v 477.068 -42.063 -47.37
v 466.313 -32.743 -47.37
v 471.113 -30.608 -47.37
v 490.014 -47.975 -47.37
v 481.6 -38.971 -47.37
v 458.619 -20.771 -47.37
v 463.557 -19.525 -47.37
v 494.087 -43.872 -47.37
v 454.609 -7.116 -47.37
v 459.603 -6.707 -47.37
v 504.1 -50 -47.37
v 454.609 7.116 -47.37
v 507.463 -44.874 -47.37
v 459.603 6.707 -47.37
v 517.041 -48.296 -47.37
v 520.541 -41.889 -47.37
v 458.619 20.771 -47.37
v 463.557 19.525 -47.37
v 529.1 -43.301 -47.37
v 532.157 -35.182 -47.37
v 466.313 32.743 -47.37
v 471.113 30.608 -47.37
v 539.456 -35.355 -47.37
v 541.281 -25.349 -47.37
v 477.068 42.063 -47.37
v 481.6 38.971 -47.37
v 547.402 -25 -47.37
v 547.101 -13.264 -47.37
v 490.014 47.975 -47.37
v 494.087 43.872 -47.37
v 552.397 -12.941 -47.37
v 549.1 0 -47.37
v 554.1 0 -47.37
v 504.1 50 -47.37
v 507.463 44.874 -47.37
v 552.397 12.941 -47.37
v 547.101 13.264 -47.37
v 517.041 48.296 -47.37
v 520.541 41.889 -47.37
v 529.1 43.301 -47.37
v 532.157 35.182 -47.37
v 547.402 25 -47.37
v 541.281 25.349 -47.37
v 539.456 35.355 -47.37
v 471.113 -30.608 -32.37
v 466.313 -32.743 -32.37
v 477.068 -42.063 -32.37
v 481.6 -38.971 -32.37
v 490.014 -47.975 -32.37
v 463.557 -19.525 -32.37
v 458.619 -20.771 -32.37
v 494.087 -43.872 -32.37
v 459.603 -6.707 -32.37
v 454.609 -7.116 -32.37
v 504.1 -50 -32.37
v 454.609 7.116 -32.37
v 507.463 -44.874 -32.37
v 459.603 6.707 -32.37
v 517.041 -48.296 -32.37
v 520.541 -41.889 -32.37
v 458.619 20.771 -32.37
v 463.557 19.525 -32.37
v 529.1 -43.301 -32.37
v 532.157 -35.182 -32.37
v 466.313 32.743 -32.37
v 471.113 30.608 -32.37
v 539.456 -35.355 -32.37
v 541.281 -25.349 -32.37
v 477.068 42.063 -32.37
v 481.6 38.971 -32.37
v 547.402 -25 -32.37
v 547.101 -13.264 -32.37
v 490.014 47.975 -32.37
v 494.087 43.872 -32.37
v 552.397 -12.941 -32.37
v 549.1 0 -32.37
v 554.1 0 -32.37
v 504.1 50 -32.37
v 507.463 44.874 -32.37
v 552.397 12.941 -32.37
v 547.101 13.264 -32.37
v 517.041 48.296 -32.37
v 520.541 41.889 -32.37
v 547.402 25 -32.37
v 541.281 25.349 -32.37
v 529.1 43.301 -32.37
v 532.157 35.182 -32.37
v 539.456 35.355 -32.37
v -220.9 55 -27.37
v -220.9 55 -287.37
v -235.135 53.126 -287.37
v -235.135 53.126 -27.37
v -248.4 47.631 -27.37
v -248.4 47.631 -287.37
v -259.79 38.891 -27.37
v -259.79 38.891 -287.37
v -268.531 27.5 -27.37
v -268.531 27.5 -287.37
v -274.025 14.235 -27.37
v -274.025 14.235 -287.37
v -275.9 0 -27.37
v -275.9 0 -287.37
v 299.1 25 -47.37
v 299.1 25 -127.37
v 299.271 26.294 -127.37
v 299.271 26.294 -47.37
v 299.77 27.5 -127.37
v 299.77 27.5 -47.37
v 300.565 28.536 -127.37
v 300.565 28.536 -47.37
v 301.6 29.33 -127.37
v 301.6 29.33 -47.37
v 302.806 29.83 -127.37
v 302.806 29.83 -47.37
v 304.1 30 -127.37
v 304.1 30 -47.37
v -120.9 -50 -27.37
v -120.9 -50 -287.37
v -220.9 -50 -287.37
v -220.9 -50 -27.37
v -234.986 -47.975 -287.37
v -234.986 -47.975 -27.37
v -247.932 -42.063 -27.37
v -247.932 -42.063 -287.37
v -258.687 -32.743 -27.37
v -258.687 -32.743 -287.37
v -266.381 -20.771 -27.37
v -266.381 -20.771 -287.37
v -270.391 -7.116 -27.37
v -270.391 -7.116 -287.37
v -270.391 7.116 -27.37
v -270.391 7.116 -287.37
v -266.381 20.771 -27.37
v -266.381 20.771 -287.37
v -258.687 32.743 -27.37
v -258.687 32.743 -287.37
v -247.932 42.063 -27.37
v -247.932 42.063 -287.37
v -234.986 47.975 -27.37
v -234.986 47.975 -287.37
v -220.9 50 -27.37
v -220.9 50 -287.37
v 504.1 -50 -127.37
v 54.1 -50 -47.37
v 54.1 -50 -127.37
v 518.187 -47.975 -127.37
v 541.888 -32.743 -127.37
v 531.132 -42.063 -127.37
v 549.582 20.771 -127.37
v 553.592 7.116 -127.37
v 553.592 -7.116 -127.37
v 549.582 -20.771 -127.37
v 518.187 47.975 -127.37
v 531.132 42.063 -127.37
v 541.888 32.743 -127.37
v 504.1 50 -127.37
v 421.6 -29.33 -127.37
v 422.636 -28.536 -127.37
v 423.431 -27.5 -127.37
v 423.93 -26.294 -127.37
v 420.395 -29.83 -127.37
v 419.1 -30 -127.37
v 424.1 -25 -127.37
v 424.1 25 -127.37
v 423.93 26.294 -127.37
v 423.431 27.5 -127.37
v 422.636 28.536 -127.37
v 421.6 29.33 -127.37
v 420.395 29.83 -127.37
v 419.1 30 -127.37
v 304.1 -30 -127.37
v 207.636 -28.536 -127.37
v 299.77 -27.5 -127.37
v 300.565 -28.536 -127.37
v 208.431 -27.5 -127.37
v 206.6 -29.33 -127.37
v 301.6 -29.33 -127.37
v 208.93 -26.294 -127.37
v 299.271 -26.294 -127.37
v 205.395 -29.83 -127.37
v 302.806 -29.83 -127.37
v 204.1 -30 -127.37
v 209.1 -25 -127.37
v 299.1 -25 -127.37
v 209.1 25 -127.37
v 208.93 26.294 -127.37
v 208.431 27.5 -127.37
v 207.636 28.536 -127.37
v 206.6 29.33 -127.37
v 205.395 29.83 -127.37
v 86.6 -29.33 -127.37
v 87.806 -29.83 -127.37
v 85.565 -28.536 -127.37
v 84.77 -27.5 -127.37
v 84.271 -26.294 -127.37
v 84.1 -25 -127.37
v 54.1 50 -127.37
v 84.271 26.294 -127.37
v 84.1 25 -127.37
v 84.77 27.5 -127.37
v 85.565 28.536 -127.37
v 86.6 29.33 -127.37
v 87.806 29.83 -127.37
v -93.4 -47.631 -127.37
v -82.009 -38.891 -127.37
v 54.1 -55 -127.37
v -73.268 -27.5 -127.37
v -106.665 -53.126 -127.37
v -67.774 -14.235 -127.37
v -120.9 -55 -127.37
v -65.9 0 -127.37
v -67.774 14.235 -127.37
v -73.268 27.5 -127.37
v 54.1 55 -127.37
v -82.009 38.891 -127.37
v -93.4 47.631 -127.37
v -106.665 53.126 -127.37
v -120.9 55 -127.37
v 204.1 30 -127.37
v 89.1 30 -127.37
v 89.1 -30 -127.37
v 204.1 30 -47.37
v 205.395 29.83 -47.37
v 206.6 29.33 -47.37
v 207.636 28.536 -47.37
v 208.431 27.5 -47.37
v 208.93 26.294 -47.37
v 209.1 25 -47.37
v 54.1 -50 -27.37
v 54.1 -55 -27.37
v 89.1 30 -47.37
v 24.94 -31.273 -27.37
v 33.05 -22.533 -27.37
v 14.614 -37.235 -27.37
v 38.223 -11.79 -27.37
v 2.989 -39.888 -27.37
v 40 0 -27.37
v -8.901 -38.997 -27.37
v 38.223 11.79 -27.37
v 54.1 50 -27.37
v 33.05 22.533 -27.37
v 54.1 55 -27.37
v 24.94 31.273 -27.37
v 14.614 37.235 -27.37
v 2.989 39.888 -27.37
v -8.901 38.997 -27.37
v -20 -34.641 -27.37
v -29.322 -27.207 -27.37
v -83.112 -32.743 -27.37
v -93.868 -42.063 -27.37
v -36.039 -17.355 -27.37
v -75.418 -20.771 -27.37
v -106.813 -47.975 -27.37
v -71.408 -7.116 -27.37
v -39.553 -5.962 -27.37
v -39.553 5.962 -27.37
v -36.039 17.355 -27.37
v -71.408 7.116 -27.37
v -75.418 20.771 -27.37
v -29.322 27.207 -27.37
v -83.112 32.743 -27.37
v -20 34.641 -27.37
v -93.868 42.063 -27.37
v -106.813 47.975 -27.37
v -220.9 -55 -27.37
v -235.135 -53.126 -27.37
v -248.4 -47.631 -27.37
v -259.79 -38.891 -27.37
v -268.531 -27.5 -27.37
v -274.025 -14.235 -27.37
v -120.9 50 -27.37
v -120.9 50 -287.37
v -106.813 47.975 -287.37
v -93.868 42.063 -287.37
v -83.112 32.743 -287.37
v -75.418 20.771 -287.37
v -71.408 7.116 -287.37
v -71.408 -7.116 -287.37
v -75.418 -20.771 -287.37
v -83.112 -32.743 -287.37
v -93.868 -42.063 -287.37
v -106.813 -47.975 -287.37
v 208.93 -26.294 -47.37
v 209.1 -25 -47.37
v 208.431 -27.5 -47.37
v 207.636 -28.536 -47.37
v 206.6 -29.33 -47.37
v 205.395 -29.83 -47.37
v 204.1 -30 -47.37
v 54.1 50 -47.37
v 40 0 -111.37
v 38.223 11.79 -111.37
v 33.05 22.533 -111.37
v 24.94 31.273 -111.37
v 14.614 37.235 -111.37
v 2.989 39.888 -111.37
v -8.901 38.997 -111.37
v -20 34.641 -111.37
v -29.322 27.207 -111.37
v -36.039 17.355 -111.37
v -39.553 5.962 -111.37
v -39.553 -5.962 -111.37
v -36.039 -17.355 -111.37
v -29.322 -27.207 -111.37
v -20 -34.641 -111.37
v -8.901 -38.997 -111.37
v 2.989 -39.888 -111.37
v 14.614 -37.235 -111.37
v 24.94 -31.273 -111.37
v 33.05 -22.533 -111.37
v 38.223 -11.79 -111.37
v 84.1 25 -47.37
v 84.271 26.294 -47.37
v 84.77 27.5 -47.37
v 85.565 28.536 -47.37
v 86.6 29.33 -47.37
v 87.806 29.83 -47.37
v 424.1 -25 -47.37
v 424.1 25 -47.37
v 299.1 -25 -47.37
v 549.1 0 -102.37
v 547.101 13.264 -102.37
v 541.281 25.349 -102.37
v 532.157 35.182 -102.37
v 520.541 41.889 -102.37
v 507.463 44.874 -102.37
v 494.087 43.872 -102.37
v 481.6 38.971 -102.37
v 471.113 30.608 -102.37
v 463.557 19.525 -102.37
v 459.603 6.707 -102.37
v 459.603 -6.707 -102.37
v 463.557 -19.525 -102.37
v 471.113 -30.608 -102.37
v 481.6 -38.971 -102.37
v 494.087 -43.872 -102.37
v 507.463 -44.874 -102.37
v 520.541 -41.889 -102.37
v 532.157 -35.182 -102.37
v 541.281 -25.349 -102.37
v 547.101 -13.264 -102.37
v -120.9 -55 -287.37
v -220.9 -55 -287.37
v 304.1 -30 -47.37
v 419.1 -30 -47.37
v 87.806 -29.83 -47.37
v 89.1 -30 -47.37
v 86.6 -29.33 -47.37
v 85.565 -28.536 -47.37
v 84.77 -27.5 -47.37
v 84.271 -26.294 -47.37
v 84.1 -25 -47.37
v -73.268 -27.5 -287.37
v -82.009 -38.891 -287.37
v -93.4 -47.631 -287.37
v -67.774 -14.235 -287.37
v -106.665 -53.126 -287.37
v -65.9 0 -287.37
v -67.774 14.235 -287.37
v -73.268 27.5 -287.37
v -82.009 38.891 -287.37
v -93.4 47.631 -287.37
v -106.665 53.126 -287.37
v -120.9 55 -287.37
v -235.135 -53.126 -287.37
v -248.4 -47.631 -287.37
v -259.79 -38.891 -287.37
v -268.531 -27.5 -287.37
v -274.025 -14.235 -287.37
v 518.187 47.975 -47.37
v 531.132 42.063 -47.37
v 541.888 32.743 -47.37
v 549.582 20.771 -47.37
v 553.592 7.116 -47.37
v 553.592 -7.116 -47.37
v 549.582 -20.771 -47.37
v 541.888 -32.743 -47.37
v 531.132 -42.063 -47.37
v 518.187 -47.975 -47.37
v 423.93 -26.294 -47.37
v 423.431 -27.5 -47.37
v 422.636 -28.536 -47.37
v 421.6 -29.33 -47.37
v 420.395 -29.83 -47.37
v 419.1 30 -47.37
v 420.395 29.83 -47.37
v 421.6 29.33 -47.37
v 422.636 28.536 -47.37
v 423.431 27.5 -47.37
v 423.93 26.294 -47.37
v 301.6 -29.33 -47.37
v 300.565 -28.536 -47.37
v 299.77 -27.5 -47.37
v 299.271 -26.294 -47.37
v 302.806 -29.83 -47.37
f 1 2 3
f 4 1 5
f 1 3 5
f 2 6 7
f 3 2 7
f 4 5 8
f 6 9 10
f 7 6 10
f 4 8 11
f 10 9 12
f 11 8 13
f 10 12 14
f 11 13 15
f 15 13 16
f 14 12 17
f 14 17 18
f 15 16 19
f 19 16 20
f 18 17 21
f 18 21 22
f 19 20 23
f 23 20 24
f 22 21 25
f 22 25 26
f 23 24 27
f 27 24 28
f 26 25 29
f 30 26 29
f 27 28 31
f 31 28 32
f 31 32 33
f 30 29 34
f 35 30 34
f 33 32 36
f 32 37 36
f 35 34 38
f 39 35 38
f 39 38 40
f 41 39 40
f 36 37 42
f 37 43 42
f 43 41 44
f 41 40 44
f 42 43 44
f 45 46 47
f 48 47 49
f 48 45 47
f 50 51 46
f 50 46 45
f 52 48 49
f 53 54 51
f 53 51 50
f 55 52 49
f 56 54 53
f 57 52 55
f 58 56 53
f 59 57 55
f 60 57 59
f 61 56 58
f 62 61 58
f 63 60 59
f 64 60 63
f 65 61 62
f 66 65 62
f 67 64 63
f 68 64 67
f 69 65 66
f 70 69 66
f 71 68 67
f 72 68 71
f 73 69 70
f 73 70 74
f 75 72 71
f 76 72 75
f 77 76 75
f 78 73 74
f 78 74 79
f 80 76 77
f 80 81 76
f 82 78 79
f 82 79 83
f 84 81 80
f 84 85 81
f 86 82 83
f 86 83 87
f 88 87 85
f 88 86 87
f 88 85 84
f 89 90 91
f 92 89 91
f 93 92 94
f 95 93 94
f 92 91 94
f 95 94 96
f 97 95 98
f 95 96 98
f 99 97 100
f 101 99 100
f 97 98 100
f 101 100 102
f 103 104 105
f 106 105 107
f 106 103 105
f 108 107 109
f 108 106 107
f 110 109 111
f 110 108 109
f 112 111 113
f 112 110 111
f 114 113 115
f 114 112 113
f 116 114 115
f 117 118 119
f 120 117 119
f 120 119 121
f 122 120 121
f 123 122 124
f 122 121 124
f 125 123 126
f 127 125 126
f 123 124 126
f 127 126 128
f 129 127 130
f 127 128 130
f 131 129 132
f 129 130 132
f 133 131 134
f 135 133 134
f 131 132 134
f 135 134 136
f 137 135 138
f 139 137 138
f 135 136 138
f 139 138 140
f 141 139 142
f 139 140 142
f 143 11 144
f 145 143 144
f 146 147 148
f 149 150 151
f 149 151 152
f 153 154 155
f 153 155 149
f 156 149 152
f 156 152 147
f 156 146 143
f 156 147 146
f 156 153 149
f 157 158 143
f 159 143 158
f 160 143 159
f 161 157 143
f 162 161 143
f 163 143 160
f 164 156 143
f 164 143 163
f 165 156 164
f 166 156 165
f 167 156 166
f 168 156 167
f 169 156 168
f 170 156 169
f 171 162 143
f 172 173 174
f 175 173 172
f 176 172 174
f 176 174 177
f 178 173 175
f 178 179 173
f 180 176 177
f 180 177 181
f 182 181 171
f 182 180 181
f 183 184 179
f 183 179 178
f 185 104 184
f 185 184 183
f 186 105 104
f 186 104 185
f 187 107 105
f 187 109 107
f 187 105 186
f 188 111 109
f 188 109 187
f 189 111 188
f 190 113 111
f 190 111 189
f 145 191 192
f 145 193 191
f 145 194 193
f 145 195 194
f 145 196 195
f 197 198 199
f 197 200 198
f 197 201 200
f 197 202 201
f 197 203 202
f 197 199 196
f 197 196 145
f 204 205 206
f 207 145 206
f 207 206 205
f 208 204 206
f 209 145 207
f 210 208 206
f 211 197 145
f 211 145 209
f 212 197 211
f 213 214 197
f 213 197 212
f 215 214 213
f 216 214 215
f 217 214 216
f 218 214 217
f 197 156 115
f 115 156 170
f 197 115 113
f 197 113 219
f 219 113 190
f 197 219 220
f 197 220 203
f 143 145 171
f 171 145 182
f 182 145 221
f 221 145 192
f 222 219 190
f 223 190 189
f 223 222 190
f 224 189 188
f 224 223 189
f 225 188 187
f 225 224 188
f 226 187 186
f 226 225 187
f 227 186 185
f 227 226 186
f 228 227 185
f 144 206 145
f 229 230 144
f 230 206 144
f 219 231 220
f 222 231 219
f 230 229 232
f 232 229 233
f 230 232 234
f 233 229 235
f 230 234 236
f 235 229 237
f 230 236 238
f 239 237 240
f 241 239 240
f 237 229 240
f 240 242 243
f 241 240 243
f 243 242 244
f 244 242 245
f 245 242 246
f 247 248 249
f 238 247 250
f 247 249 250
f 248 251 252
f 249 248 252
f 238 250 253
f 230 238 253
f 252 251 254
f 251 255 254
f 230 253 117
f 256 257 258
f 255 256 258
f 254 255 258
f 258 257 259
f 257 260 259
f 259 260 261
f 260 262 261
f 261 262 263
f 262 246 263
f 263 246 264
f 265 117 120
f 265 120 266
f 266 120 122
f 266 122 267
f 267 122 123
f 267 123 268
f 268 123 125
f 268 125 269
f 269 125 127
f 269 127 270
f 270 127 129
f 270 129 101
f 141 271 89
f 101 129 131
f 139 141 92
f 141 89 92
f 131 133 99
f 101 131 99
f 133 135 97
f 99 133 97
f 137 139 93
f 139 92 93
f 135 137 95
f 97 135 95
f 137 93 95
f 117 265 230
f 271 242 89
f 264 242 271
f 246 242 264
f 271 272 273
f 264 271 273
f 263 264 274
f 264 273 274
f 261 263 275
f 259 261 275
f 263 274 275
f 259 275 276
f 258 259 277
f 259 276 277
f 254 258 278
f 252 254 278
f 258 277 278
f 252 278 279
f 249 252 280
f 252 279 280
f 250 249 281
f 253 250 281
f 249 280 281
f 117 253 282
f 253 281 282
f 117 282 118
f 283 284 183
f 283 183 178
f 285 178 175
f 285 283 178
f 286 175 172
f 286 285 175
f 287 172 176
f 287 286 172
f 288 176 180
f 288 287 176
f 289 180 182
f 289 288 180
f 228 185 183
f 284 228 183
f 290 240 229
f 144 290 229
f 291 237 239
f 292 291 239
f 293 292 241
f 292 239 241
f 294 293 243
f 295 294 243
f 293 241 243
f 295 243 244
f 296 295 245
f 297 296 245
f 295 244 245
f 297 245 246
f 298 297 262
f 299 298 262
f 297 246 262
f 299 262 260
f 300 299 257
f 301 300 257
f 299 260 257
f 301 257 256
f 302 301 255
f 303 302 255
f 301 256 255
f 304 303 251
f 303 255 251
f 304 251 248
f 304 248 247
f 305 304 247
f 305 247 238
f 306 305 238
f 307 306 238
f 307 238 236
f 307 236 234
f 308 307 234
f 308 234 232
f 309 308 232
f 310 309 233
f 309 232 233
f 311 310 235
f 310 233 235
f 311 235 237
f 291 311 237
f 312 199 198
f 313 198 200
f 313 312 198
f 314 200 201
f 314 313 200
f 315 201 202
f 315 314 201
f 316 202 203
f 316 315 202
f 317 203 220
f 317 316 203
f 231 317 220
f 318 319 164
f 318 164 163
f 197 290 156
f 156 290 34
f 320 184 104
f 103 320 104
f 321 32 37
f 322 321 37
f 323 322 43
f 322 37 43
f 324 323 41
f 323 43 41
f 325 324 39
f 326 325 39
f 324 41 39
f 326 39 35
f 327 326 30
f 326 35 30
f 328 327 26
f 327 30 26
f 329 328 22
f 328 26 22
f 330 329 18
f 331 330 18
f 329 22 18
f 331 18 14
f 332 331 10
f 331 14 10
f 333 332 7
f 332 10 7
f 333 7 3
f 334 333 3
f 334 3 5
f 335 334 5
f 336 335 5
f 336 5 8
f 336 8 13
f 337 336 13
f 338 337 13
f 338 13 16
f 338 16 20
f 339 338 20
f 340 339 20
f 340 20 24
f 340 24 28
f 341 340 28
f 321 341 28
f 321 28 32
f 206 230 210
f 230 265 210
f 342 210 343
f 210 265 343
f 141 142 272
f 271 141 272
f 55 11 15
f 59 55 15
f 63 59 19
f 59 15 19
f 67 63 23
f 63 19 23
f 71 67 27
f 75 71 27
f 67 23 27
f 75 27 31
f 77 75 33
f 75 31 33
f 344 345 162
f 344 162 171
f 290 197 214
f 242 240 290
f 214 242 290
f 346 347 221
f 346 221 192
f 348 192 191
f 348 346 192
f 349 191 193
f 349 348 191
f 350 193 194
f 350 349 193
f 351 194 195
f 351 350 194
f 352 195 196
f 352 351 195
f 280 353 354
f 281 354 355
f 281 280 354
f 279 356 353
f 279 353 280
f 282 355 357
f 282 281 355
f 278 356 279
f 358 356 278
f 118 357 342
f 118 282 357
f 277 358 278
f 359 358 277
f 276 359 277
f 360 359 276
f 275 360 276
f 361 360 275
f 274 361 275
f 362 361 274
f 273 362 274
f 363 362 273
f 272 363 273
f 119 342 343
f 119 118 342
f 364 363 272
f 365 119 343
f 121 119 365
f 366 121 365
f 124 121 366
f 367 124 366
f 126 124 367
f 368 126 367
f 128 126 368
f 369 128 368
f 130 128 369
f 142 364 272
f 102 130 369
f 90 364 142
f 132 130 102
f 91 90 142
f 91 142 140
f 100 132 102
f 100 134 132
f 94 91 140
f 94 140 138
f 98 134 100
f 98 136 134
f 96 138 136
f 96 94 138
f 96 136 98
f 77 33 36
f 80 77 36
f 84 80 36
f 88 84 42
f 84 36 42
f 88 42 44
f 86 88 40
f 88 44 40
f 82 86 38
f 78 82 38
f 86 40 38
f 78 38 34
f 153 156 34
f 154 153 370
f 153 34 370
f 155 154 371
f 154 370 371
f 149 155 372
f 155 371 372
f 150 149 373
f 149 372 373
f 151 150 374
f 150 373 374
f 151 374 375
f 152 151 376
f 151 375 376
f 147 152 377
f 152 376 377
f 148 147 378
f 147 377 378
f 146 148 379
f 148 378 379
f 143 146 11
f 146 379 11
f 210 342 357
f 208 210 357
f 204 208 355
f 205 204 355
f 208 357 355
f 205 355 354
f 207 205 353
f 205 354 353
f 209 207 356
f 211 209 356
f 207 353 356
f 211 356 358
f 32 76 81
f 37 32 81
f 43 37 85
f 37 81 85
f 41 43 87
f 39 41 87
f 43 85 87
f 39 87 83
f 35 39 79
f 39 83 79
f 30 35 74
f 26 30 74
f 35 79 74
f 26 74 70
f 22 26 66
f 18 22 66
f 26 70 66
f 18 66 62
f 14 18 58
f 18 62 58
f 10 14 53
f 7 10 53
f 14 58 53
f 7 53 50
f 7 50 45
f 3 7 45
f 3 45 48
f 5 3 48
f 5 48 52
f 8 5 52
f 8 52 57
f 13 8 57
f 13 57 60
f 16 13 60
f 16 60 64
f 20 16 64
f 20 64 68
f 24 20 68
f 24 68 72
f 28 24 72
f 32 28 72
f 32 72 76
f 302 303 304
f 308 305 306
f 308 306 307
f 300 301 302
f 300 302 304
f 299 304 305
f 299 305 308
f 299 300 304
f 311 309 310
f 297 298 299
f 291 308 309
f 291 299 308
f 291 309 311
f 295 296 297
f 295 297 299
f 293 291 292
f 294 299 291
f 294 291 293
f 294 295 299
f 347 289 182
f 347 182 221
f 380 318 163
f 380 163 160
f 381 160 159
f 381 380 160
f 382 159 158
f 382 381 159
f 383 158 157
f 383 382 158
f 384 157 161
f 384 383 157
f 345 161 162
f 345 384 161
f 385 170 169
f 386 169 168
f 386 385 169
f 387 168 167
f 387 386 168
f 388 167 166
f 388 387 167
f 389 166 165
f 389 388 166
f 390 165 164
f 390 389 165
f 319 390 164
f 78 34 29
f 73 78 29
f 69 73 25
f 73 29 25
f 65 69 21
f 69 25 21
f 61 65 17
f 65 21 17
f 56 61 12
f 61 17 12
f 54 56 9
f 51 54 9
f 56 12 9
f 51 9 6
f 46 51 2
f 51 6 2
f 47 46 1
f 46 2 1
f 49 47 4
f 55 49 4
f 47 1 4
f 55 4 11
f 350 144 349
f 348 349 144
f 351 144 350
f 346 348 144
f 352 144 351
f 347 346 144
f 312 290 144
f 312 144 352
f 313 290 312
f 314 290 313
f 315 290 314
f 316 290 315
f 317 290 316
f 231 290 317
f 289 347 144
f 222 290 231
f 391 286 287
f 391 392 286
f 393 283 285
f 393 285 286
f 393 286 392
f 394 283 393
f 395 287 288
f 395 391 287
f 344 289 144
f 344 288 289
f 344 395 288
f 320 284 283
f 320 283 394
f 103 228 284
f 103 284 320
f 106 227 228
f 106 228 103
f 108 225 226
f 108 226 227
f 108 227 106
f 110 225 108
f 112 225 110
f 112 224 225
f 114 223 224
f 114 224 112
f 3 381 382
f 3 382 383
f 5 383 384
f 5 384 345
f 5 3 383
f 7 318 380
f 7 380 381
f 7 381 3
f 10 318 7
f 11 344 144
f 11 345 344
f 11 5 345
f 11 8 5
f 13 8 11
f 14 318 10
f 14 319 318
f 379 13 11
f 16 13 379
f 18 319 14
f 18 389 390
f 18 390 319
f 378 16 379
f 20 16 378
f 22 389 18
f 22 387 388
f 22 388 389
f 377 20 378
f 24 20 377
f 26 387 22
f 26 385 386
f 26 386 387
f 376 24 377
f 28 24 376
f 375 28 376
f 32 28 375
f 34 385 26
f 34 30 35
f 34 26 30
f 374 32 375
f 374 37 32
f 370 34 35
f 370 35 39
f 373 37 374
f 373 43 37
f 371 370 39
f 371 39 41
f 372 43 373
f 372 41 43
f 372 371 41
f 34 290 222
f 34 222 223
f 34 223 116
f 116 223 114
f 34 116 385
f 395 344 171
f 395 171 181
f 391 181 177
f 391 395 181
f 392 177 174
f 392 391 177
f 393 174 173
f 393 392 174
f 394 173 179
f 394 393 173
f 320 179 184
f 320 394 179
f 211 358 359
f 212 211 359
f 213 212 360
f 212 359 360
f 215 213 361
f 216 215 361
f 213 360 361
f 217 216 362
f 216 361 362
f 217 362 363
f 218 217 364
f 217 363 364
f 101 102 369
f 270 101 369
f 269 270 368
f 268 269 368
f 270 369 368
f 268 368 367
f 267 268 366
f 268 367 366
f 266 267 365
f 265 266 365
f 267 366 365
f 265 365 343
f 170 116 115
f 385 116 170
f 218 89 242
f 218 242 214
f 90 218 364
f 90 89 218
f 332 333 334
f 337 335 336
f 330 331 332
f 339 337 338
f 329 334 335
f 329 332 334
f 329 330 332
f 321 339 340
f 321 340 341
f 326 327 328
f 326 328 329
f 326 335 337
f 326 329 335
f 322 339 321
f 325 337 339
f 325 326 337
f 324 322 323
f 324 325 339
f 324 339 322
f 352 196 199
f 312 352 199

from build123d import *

# Parameters (mm, degrees)
SKETCH1_R             = 50
SKETCH1_W             = 100
SKETCH1_H             = 110
SKETCH1_W_2           = 230
SKETCH1_H_2           = 55
BOSS_EXTRUDE1_DEPTH   = 100
SKETCH2_W             = 160
SKETCH2_H             = 210
BOSS_EXTRUDE2_DEPTH   = 110
CUT_EXTRUDE1_DEPTH    = 260
CUT_EXTRUDE2_DEPTH    = 160
CUT_EXTRUDE3_DEPTH    = 100
BODY_MOVE_COPY1_ANGLE = 86
SKETCH15_R            = 40
CUT_EXTRUDE4_DEPTH    = 84
CUT_EXTRUDE5_DEPTH    = 20
BOSS_EXTRUDE3_DEPTH   = 15
BODY_MOVE_COPY6_ANGLE = 4
CUT_EXTRUDE6_DEPTH    = 270
SKETCH20_R            = 45
CUT_EXTRUDE7_DEPTH    = 70


with BuildPart() as part:
    # Sketch1 → Boss-Extrude1 (new body)
    with BuildSketch(Plane(origin=(0, 0, 0), x_dir=(0, 0, -1), z_dir=(1, 0, 0))):
        with BuildLine():
            Line((-50, 50), (-500, 50))
            ThreePointArc((-500, 50), (-464.644660941, 35.355339059), (-450, 0))
            ThreePointArc((-450, 0), (-464.644660941, -35.355339059), (-500, -50))
            Line((-500, -50), (-50, -50))
            Line((-50, -50), (-50, 50))
        make_face()
        with Locations((-500, 0)):
            Circle(SKETCH1_R)
        Rectangle(SKETCH1_W, SKETCH1_H)
        with Locations((165, -27.5)):
            Rectangle(SKETCH1_W_2, SKETCH1_H_2)
        with Locations((165, 27.5)):
            Rectangle(SKETCH1_W_2, SKETCH1_H_2)
    extrude(amount=BOSS_EXTRUDE1_DEPTH)

    # Sketch2 → Boss-Extrude2 (add)
    with BuildSketch(Plane(origin=(0, 55, 0), x_dir=(1, 0, 0), z_dir=(0, 1, 0))):
        with Locations((180, 175)):
            Rectangle(SKETCH2_W, SKETCH2_H)
    extrude(amount=-BOSS_EXTRUDE2_DEPTH)

    # Sketch3 → Cut-Extrude1 (cut)
    with BuildSketch(Plane(origin=(260, 0, 0), x_dir=(0, 0, -1), z_dir=(1, 0, 0))):
        with BuildLine():
            ThreePointArc((225, 55), (263.890872965, 38.890872965), (280, 0))
            Line((280, 0), (280, 55))
            Line((280, 55), (225, 55))
        make_face()
        with BuildLine():
            ThreePointArc((280, 0), (263.890872965, -38.890872965), (225, -55))
            Line((225, -55), (280, -55))
            Line((280, -55), (280, 0))
        make_face()
    extrude(amount=-CUT_EXTRUDE1_DEPTH, mode=Mode.SUBTRACT)

    # Sketch3<3> → Cut-Extrude2 (cut)
    with BuildSketch(Plane(origin=(260, 0, 0), x_dir=(0, 0, -1), z_dir=(1, 0, 0))):
        with BuildLine():
            Line((70, 55), (70, 2.89e-07))
            ThreePointArc((70, 2.89e-07), (86.109127186, 38.890873117), (125.00000014, 55))
            Line((125.00000014, 55), (70, 55))
        make_face()
        with BuildLine():
            Line((70, 2.89e-07), (70, -55))
            Line((70, -55), (125.000000101, -55))
            ThreePointArc((125.000000101, -55), (86.109126968, -38.890872899), (70, 2.89e-07))
        make_face()
    extrude(amount=-CUT_EXTRUDE2_DEPTH, mode=Mode.SUBTRACT)

    # Sketch12 → Cut-Extrude3 (cut)
    with BuildSketch(Plane.ZY):
        with BuildLine():
            Line((85, 30), (200, 30))
            ThreePointArc((200, 30), (203.535533906, 28.535533906), (205, 25))
            Line((205, 25), (205, -25))
            ThreePointArc((205, -25), (203.535533906, -28.535533906), (200, -30))
            Line((200, -30), (85, -30))
            ThreePointArc((85, -30), (81.464466094, -28.535533906), (80, -25))
            Line((80, -25), (80, 25))
            ThreePointArc((80, 25), (81.464466094, 28.535533906), (85, 30))
        make_face()
        with BuildLine():
            Line((415, -30), (300, -30))
            ThreePointArc((300, -30), (296.464466094, -28.535533906), (295, -25))
            Line((295, -25), (295, 25))
            ThreePointArc((295, 25), (296.464466094, 28.535533906), (300, 30))
            Line((300, 30), (415, 30))
            ThreePointArc((415, 30), (418.535533906, 28.535533906), (420, 25))
            Line((420, 25), (420, -25))
            ThreePointArc((420, -25), (418.535533906, -28.535533906), (415, -30))
        make_face()
    extrude(amount=-CUT_EXTRUDE3_DEPTH, mode=Mode.SUBTRACT)


with BuildPart() as part_1:
    # Body-Move/Copy1: moved
    add(part.part.rotate(Axis((130, 0, 135), (0, 1, 0)), BODY_MOVE_COPY1_ANGLE))

    # Sketch15 → Cut-Extrude4 (cut)
    with BuildSketch(Plane(origin=(-17.82995037, 0, 254.980169612), x_dir=(0.99756405, 0, 0.069756474), z_dir=(-0.069756474, 0, 0.99756405))):
        Circle(SKETCH15_R)
    extrude(amount=-CUT_EXTRUDE4_DEPTH, mode=Mode.SUBTRACT)


with BuildPart() as part_2:
    # Body-Move/Copy2: moved
    add(part_1.part.moved(Location((17.82995037, 0, -254.980169612))))

    # Sketch17 → Cut-Extrude5 (cut)
    with BuildSketch(Plane(origin=(0, 0, 0), x_dir=(0.99756405, 0, 0.069756474), z_dir=(-0.069756474, 0, 0.99756405))):
        with BuildLine():
            Line((54.100450489, 50), (54.100450489, -50))
            Line((54.100450489, -50), (504.100450489, -50))
            ThreePointArc((504.100450489, -50), (554.100450489, 0), (504.100450489, 50))
            Line((504.100450489, 50), (54.100450489, 50))
        make_face()
        with BuildLine():
            ThreePointArc((424.100450489, -25), (422.635984395, -28.535533906), (419.100450489, -30))
            Line((419.100450489, -30), (304.100450489, -30))
            ThreePointArc((304.100450489, -30), (300.564916583, -28.535533906), (299.100450489, -25))
            Line((299.100450489, -25), (299.100450489, 25))
            ThreePointArc((299.100450489, 25), (300.564916583, 28.535533906), (304.100450489, 30))
            Line((304.100450489, 30), (419.100450489, 30))
            ThreePointArc((419.100450489, 30), (422.635984395, 28.535533906), (424.100450489, 25))
            Line((424.100450489, 25), (424.100450489, -25))
        make_face(mode=Mode.SUBTRACT)
        with BuildLine():
            ThreePointArc((209.100450489, -25), (207.635984395, -28.535533906), (204.100450489, -30))
            Line((204.100450489, -30), (89.100450489, -30))
            ThreePointArc((89.100450489, -30), (85.564916583, -28.535533906), (84.100450489, -25))
            Line((84.100450489, -25), (84.100450489, 25))
            ThreePointArc((84.100450489, 25), (85.564916583, 28.535533906), (89.100450489, 30))
            Line((89.100450489, 30), (204.100450489, 30))
            ThreePointArc((204.100450489, 30), (207.635984395, 28.535533906), (209.100450489, 25))
            Line((209.100450489, 25), (209.100450489, -25))
        make_face(mode=Mode.SUBTRACT)
    extrude(amount=-CUT_EXTRUDE5_DEPTH, mode=Mode.SUBTRACT)


with BuildPart() as body_2:
    # Sketch18 → Boss-Extrude3 (new body)
    with BuildSketch(Plane(origin=(1.395129475, 0, -19.951281005), x_dir=(0.99756405, 0, 0.069756474), z_dir=(-0.069756474, 0, 0.99756405))):
        with BuildLine():
            ThreePointArc((554.100450489, 0), (539.455789548, 35.355339059), (504.100450489, 50))
            ThreePointArc((504.100450489, 50), (454.100450489, 0), (504.100450489, -50))
            ThreePointArc((504.100450489, -50), (539.455789548, -35.355339059), (554.100450489, 0))
        make_face()
    extrude(amount=BOSS_EXTRUDE3_DEPTH)


with BuildPart() as part_3:
    # Body-Move/Copy6: moved
    add(part_2.part.rotate(Axis((0, 0, 0), (0, 1, 0)), BODY_MOVE_COPY6_ANGLE))


with BuildPart() as body_2_1:
    # Body-Move/Copy6: moved
    add(body_2.part.rotate(Axis((0, 0, 0), (0, 1, 0)), BODY_MOVE_COPY6_ANGLE))


with BuildPart() as part_4:
    # Body-Move/Copy7: moved
    add(part_3.part.moved(Location((0, 0, -27.37))))

    # Sketch19 → Cut-Extrude6 (cut)
    with BuildSketch(Plane(origin=(0, 0, -287.37), x_dir=(-1, 0, 0), z_dir=(0, 0, -1))):
        with BuildLine():
            Line((120.899549511, -50), (220.899549511, -50))
            ThreePointArc((220.899549511, -50), (270.899549511, 0), (220.899549511, 50))
            Line((220.899549511, 50), (120.899549511, 50))
            ThreePointArc((120.899549511, 50), (70.899549511, 0), (120.899549511, -50))
        make_face()
    extrude(amount=-CUT_EXTRUDE6_DEPTH, mode=Mode.SUBTRACT)


with BuildPart() as body_2_2:
    # Body-Move/Copy7: moved
    add(body_2_1.part.moved(Location((0, 0, -27.37))))


with BuildPart() as cut_extrude7_tool:
    # Sketch20 → Cut-Extrude7 (new body)
    with BuildSketch(Plane.XY.offset(-32.37)):
        with Locations((504.100450489, 0)):
            Circle(SKETCH20_R)
    extrude(amount=-CUT_EXTRUDE7_DEPTH)


with BuildPart() as part_5:
    add(part_4.part)

    # Cut-Extrude7: cut by cut_extrude7_tool
    add(cut_extrude7_tool.part, mode=Mode.SUBTRACT)


with BuildPart() as body_2_3:
    add(body_2_2.part)

    # Cut-Extrude7: cut by cut_extrude7_tool
    add(cut_extrude7_tool.part, mode=Mode.SUBTRACT)


solid = Compound([part_5.part, body_2_3.part])
